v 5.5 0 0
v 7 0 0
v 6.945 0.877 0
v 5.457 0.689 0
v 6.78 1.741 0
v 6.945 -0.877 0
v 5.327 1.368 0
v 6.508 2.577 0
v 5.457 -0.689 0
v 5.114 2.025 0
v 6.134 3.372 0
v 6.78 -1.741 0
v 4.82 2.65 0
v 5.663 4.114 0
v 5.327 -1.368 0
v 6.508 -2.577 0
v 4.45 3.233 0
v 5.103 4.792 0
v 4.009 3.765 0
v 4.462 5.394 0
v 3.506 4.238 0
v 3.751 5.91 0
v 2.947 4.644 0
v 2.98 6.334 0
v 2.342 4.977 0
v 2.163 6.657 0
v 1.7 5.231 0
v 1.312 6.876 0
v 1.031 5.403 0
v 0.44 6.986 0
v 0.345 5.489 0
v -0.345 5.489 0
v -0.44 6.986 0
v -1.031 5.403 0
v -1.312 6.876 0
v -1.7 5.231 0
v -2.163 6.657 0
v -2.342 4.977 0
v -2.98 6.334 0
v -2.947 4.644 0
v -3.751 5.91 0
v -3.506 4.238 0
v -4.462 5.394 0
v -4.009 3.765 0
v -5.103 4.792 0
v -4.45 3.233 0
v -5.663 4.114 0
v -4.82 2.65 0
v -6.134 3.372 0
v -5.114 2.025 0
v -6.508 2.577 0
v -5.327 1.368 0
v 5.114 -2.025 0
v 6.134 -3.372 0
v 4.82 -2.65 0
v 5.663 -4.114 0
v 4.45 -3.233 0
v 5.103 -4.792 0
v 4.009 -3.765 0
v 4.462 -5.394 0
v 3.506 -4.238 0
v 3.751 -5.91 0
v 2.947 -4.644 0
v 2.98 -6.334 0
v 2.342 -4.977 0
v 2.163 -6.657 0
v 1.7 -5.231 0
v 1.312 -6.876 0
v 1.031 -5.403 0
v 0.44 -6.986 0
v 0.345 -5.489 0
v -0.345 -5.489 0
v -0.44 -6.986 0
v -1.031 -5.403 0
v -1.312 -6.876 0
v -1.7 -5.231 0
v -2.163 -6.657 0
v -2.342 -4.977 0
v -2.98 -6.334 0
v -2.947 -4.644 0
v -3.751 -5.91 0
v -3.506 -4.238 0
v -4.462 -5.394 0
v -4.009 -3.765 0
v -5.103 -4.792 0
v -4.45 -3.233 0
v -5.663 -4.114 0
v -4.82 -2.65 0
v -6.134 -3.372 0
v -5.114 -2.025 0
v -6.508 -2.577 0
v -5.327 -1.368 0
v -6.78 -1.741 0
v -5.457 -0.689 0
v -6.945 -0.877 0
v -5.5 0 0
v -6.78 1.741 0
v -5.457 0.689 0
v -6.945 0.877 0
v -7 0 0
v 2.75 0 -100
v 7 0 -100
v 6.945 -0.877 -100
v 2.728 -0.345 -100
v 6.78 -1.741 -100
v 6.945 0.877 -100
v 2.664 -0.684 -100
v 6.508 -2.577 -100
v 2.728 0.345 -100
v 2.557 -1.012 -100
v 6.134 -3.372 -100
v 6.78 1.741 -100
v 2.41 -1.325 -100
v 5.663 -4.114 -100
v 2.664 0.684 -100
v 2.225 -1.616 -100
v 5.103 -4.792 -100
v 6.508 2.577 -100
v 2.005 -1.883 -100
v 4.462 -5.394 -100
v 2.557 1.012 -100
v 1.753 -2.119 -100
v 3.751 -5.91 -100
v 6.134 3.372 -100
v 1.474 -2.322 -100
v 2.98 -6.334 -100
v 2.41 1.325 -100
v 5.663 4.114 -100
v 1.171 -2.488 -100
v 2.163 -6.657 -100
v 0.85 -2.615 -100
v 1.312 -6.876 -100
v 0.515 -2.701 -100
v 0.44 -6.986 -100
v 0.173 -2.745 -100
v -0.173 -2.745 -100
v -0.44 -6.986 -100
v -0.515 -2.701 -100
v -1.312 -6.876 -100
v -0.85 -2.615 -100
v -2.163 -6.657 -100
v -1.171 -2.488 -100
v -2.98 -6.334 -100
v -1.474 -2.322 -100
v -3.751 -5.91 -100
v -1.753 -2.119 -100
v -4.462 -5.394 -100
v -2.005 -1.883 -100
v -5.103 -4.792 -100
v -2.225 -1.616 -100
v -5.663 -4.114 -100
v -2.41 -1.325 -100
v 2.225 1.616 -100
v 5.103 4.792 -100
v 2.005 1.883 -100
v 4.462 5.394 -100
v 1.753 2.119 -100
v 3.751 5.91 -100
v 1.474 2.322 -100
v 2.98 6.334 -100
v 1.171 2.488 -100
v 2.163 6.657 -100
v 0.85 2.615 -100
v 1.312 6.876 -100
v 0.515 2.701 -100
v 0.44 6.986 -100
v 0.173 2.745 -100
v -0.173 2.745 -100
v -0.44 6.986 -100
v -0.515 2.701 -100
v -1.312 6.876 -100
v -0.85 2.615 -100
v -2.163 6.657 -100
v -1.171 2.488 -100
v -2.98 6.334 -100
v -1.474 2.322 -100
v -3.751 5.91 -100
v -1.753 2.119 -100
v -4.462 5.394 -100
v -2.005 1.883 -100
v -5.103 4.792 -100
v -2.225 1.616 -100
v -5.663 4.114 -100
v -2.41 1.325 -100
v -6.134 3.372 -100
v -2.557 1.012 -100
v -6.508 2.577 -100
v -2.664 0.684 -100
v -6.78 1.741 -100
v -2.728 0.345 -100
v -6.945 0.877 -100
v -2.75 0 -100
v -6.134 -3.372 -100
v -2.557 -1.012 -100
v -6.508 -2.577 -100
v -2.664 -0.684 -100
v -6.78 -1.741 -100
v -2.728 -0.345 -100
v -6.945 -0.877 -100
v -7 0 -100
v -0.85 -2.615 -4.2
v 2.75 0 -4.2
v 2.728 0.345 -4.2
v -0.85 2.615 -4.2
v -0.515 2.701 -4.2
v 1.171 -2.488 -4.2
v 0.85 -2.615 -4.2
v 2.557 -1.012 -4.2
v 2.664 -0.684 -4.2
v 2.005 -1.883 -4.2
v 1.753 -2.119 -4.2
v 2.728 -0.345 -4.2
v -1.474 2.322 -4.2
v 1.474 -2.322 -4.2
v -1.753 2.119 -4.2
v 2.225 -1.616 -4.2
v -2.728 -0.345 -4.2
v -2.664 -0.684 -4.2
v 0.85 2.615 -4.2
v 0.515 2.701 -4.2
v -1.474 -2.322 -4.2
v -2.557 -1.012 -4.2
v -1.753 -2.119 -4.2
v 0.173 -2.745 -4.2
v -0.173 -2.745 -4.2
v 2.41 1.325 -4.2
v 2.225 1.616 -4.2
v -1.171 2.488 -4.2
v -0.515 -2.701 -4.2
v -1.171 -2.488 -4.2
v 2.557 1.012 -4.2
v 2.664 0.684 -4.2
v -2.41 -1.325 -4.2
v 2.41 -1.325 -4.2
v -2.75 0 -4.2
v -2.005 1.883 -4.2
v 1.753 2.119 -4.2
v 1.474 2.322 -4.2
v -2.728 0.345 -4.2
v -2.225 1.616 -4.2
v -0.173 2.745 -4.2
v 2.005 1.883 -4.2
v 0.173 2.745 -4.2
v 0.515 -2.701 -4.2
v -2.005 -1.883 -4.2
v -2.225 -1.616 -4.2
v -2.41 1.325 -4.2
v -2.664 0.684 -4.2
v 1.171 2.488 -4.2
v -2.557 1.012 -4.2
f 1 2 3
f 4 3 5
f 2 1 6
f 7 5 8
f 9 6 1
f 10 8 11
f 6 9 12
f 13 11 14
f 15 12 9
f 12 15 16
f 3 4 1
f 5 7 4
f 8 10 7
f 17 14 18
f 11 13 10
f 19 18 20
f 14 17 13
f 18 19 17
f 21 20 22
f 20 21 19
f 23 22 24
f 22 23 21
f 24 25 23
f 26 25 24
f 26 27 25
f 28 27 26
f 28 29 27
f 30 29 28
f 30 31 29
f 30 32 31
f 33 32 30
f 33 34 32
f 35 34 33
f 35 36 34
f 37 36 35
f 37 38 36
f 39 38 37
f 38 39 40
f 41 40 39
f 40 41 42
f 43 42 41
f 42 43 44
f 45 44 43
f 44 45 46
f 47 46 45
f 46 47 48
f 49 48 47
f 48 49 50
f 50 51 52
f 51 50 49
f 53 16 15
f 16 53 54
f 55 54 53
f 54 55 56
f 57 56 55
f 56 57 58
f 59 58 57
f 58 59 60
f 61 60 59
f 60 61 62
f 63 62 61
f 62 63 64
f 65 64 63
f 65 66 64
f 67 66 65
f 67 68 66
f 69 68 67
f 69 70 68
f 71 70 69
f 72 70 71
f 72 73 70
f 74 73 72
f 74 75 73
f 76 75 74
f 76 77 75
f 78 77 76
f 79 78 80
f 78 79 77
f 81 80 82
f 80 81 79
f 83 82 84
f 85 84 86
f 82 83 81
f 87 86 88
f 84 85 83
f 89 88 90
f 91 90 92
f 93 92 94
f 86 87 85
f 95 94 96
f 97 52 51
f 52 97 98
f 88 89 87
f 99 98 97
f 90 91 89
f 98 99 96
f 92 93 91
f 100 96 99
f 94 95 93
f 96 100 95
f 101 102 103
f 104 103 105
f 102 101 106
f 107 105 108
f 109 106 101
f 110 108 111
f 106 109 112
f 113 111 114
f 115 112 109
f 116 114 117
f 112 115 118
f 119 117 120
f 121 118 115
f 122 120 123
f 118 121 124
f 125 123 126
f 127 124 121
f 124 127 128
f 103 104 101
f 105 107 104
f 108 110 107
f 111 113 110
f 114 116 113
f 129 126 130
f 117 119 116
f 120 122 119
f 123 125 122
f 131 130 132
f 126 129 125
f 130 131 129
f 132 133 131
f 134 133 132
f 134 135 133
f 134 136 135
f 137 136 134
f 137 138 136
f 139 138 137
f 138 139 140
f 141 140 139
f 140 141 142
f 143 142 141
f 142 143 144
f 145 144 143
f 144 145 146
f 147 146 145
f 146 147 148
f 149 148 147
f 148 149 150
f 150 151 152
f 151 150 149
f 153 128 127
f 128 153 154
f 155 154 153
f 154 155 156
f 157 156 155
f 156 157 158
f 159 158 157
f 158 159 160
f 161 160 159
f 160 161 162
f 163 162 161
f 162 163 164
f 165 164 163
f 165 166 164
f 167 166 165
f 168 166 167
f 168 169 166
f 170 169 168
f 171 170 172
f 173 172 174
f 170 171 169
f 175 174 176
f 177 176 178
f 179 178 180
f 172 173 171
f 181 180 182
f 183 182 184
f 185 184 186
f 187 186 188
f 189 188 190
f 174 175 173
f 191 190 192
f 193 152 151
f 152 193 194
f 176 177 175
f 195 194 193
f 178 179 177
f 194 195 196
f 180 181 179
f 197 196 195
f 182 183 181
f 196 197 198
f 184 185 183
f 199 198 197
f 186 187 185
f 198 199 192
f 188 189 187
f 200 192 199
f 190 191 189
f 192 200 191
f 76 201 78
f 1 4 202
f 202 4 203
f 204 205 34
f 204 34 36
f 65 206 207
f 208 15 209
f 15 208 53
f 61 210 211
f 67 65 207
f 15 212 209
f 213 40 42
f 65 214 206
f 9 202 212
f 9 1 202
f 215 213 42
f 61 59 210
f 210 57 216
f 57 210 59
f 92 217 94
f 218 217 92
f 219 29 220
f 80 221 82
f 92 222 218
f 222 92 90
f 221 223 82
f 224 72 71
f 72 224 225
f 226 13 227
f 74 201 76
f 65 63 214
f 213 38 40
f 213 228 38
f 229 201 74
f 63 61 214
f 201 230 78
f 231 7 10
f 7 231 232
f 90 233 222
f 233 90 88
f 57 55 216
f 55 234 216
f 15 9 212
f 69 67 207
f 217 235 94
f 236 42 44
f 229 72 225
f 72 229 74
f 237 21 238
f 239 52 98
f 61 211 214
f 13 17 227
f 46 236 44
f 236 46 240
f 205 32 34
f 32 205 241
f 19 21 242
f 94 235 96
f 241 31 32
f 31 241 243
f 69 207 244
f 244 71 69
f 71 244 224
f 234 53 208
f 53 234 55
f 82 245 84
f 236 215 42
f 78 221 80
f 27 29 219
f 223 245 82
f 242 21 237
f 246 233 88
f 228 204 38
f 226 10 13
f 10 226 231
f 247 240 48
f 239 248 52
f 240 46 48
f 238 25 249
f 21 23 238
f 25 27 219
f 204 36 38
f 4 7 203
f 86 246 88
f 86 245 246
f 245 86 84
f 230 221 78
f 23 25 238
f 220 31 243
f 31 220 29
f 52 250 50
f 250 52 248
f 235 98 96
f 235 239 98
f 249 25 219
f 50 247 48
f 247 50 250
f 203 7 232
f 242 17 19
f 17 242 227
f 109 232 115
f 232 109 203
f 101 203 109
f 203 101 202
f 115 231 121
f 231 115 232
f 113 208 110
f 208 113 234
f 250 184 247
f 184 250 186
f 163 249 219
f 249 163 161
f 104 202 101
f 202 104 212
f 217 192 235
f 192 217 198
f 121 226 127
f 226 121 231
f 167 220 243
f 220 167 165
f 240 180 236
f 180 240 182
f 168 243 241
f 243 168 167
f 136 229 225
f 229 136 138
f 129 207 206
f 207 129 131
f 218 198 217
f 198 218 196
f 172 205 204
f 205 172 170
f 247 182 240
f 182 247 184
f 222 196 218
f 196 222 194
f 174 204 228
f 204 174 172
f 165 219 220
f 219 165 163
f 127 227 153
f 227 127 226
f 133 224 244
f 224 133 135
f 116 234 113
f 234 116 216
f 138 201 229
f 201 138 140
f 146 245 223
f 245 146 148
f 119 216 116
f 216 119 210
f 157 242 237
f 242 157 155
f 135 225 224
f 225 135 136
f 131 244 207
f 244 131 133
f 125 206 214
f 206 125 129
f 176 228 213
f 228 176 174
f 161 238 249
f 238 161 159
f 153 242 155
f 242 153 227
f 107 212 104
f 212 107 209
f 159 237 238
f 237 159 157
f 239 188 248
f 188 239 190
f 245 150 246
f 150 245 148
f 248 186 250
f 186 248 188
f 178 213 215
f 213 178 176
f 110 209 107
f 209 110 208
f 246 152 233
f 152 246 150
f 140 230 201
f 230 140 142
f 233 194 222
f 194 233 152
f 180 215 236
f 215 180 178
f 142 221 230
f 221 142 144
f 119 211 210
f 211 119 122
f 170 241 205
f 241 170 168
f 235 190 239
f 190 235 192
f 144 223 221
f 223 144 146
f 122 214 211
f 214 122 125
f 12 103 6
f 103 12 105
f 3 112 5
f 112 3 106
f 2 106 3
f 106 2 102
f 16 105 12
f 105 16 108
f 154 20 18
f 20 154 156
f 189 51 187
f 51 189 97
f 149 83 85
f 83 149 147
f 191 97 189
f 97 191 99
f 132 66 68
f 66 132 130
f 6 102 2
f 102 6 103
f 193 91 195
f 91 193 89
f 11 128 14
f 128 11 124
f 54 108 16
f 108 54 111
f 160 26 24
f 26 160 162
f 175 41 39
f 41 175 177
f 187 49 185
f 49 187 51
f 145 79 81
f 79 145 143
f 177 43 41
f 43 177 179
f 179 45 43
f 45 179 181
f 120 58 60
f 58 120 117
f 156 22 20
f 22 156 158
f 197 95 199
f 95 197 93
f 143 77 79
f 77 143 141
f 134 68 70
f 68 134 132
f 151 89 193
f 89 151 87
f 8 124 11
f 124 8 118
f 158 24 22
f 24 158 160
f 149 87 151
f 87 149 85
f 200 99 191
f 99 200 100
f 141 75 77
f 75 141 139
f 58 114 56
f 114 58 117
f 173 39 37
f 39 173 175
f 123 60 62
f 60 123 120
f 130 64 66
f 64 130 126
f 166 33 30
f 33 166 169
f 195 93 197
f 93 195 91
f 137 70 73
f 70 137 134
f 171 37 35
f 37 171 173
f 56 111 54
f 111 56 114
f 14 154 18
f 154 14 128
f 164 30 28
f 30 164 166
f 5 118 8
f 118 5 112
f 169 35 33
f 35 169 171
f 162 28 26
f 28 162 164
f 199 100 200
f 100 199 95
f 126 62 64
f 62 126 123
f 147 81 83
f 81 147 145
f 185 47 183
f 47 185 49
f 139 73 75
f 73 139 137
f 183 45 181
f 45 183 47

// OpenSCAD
$fn = 50;


difference() {
	union() {
		translate(v = [0, 0, -100.0000000000]) {
			cylinder(h = 100, r = 7.0000000000);
		}
		cylinder(h = 0, r = 10.0000000000);
	}
	union() {
		translate(v = [0, 0, 0]) {
			rotate(a = [0, 0, 0]) {
				difference() {
					union() {
						#translate(v = [0, 0, -100.0000000000]) {
							cylinder(h = 100, r = 2.2500000000);
						}
						#translate(v = [0, 0, -4.2000000000]) {
							cylinder(h = 4.2000000000, r1 = 2.7500000000, r2 = 5.5000000000);
						}
						#translate(v = [0, 0, -100.0000000000]) {
							cylinder(h = 100, r = 2.7500000000);
						}
						#translate(v = [0, 0, -100.0000000000]) {
							cylinder(h = 100, r = 2.2500000000);
						}
					}
					union();
				}
			}
		}
	}
}
